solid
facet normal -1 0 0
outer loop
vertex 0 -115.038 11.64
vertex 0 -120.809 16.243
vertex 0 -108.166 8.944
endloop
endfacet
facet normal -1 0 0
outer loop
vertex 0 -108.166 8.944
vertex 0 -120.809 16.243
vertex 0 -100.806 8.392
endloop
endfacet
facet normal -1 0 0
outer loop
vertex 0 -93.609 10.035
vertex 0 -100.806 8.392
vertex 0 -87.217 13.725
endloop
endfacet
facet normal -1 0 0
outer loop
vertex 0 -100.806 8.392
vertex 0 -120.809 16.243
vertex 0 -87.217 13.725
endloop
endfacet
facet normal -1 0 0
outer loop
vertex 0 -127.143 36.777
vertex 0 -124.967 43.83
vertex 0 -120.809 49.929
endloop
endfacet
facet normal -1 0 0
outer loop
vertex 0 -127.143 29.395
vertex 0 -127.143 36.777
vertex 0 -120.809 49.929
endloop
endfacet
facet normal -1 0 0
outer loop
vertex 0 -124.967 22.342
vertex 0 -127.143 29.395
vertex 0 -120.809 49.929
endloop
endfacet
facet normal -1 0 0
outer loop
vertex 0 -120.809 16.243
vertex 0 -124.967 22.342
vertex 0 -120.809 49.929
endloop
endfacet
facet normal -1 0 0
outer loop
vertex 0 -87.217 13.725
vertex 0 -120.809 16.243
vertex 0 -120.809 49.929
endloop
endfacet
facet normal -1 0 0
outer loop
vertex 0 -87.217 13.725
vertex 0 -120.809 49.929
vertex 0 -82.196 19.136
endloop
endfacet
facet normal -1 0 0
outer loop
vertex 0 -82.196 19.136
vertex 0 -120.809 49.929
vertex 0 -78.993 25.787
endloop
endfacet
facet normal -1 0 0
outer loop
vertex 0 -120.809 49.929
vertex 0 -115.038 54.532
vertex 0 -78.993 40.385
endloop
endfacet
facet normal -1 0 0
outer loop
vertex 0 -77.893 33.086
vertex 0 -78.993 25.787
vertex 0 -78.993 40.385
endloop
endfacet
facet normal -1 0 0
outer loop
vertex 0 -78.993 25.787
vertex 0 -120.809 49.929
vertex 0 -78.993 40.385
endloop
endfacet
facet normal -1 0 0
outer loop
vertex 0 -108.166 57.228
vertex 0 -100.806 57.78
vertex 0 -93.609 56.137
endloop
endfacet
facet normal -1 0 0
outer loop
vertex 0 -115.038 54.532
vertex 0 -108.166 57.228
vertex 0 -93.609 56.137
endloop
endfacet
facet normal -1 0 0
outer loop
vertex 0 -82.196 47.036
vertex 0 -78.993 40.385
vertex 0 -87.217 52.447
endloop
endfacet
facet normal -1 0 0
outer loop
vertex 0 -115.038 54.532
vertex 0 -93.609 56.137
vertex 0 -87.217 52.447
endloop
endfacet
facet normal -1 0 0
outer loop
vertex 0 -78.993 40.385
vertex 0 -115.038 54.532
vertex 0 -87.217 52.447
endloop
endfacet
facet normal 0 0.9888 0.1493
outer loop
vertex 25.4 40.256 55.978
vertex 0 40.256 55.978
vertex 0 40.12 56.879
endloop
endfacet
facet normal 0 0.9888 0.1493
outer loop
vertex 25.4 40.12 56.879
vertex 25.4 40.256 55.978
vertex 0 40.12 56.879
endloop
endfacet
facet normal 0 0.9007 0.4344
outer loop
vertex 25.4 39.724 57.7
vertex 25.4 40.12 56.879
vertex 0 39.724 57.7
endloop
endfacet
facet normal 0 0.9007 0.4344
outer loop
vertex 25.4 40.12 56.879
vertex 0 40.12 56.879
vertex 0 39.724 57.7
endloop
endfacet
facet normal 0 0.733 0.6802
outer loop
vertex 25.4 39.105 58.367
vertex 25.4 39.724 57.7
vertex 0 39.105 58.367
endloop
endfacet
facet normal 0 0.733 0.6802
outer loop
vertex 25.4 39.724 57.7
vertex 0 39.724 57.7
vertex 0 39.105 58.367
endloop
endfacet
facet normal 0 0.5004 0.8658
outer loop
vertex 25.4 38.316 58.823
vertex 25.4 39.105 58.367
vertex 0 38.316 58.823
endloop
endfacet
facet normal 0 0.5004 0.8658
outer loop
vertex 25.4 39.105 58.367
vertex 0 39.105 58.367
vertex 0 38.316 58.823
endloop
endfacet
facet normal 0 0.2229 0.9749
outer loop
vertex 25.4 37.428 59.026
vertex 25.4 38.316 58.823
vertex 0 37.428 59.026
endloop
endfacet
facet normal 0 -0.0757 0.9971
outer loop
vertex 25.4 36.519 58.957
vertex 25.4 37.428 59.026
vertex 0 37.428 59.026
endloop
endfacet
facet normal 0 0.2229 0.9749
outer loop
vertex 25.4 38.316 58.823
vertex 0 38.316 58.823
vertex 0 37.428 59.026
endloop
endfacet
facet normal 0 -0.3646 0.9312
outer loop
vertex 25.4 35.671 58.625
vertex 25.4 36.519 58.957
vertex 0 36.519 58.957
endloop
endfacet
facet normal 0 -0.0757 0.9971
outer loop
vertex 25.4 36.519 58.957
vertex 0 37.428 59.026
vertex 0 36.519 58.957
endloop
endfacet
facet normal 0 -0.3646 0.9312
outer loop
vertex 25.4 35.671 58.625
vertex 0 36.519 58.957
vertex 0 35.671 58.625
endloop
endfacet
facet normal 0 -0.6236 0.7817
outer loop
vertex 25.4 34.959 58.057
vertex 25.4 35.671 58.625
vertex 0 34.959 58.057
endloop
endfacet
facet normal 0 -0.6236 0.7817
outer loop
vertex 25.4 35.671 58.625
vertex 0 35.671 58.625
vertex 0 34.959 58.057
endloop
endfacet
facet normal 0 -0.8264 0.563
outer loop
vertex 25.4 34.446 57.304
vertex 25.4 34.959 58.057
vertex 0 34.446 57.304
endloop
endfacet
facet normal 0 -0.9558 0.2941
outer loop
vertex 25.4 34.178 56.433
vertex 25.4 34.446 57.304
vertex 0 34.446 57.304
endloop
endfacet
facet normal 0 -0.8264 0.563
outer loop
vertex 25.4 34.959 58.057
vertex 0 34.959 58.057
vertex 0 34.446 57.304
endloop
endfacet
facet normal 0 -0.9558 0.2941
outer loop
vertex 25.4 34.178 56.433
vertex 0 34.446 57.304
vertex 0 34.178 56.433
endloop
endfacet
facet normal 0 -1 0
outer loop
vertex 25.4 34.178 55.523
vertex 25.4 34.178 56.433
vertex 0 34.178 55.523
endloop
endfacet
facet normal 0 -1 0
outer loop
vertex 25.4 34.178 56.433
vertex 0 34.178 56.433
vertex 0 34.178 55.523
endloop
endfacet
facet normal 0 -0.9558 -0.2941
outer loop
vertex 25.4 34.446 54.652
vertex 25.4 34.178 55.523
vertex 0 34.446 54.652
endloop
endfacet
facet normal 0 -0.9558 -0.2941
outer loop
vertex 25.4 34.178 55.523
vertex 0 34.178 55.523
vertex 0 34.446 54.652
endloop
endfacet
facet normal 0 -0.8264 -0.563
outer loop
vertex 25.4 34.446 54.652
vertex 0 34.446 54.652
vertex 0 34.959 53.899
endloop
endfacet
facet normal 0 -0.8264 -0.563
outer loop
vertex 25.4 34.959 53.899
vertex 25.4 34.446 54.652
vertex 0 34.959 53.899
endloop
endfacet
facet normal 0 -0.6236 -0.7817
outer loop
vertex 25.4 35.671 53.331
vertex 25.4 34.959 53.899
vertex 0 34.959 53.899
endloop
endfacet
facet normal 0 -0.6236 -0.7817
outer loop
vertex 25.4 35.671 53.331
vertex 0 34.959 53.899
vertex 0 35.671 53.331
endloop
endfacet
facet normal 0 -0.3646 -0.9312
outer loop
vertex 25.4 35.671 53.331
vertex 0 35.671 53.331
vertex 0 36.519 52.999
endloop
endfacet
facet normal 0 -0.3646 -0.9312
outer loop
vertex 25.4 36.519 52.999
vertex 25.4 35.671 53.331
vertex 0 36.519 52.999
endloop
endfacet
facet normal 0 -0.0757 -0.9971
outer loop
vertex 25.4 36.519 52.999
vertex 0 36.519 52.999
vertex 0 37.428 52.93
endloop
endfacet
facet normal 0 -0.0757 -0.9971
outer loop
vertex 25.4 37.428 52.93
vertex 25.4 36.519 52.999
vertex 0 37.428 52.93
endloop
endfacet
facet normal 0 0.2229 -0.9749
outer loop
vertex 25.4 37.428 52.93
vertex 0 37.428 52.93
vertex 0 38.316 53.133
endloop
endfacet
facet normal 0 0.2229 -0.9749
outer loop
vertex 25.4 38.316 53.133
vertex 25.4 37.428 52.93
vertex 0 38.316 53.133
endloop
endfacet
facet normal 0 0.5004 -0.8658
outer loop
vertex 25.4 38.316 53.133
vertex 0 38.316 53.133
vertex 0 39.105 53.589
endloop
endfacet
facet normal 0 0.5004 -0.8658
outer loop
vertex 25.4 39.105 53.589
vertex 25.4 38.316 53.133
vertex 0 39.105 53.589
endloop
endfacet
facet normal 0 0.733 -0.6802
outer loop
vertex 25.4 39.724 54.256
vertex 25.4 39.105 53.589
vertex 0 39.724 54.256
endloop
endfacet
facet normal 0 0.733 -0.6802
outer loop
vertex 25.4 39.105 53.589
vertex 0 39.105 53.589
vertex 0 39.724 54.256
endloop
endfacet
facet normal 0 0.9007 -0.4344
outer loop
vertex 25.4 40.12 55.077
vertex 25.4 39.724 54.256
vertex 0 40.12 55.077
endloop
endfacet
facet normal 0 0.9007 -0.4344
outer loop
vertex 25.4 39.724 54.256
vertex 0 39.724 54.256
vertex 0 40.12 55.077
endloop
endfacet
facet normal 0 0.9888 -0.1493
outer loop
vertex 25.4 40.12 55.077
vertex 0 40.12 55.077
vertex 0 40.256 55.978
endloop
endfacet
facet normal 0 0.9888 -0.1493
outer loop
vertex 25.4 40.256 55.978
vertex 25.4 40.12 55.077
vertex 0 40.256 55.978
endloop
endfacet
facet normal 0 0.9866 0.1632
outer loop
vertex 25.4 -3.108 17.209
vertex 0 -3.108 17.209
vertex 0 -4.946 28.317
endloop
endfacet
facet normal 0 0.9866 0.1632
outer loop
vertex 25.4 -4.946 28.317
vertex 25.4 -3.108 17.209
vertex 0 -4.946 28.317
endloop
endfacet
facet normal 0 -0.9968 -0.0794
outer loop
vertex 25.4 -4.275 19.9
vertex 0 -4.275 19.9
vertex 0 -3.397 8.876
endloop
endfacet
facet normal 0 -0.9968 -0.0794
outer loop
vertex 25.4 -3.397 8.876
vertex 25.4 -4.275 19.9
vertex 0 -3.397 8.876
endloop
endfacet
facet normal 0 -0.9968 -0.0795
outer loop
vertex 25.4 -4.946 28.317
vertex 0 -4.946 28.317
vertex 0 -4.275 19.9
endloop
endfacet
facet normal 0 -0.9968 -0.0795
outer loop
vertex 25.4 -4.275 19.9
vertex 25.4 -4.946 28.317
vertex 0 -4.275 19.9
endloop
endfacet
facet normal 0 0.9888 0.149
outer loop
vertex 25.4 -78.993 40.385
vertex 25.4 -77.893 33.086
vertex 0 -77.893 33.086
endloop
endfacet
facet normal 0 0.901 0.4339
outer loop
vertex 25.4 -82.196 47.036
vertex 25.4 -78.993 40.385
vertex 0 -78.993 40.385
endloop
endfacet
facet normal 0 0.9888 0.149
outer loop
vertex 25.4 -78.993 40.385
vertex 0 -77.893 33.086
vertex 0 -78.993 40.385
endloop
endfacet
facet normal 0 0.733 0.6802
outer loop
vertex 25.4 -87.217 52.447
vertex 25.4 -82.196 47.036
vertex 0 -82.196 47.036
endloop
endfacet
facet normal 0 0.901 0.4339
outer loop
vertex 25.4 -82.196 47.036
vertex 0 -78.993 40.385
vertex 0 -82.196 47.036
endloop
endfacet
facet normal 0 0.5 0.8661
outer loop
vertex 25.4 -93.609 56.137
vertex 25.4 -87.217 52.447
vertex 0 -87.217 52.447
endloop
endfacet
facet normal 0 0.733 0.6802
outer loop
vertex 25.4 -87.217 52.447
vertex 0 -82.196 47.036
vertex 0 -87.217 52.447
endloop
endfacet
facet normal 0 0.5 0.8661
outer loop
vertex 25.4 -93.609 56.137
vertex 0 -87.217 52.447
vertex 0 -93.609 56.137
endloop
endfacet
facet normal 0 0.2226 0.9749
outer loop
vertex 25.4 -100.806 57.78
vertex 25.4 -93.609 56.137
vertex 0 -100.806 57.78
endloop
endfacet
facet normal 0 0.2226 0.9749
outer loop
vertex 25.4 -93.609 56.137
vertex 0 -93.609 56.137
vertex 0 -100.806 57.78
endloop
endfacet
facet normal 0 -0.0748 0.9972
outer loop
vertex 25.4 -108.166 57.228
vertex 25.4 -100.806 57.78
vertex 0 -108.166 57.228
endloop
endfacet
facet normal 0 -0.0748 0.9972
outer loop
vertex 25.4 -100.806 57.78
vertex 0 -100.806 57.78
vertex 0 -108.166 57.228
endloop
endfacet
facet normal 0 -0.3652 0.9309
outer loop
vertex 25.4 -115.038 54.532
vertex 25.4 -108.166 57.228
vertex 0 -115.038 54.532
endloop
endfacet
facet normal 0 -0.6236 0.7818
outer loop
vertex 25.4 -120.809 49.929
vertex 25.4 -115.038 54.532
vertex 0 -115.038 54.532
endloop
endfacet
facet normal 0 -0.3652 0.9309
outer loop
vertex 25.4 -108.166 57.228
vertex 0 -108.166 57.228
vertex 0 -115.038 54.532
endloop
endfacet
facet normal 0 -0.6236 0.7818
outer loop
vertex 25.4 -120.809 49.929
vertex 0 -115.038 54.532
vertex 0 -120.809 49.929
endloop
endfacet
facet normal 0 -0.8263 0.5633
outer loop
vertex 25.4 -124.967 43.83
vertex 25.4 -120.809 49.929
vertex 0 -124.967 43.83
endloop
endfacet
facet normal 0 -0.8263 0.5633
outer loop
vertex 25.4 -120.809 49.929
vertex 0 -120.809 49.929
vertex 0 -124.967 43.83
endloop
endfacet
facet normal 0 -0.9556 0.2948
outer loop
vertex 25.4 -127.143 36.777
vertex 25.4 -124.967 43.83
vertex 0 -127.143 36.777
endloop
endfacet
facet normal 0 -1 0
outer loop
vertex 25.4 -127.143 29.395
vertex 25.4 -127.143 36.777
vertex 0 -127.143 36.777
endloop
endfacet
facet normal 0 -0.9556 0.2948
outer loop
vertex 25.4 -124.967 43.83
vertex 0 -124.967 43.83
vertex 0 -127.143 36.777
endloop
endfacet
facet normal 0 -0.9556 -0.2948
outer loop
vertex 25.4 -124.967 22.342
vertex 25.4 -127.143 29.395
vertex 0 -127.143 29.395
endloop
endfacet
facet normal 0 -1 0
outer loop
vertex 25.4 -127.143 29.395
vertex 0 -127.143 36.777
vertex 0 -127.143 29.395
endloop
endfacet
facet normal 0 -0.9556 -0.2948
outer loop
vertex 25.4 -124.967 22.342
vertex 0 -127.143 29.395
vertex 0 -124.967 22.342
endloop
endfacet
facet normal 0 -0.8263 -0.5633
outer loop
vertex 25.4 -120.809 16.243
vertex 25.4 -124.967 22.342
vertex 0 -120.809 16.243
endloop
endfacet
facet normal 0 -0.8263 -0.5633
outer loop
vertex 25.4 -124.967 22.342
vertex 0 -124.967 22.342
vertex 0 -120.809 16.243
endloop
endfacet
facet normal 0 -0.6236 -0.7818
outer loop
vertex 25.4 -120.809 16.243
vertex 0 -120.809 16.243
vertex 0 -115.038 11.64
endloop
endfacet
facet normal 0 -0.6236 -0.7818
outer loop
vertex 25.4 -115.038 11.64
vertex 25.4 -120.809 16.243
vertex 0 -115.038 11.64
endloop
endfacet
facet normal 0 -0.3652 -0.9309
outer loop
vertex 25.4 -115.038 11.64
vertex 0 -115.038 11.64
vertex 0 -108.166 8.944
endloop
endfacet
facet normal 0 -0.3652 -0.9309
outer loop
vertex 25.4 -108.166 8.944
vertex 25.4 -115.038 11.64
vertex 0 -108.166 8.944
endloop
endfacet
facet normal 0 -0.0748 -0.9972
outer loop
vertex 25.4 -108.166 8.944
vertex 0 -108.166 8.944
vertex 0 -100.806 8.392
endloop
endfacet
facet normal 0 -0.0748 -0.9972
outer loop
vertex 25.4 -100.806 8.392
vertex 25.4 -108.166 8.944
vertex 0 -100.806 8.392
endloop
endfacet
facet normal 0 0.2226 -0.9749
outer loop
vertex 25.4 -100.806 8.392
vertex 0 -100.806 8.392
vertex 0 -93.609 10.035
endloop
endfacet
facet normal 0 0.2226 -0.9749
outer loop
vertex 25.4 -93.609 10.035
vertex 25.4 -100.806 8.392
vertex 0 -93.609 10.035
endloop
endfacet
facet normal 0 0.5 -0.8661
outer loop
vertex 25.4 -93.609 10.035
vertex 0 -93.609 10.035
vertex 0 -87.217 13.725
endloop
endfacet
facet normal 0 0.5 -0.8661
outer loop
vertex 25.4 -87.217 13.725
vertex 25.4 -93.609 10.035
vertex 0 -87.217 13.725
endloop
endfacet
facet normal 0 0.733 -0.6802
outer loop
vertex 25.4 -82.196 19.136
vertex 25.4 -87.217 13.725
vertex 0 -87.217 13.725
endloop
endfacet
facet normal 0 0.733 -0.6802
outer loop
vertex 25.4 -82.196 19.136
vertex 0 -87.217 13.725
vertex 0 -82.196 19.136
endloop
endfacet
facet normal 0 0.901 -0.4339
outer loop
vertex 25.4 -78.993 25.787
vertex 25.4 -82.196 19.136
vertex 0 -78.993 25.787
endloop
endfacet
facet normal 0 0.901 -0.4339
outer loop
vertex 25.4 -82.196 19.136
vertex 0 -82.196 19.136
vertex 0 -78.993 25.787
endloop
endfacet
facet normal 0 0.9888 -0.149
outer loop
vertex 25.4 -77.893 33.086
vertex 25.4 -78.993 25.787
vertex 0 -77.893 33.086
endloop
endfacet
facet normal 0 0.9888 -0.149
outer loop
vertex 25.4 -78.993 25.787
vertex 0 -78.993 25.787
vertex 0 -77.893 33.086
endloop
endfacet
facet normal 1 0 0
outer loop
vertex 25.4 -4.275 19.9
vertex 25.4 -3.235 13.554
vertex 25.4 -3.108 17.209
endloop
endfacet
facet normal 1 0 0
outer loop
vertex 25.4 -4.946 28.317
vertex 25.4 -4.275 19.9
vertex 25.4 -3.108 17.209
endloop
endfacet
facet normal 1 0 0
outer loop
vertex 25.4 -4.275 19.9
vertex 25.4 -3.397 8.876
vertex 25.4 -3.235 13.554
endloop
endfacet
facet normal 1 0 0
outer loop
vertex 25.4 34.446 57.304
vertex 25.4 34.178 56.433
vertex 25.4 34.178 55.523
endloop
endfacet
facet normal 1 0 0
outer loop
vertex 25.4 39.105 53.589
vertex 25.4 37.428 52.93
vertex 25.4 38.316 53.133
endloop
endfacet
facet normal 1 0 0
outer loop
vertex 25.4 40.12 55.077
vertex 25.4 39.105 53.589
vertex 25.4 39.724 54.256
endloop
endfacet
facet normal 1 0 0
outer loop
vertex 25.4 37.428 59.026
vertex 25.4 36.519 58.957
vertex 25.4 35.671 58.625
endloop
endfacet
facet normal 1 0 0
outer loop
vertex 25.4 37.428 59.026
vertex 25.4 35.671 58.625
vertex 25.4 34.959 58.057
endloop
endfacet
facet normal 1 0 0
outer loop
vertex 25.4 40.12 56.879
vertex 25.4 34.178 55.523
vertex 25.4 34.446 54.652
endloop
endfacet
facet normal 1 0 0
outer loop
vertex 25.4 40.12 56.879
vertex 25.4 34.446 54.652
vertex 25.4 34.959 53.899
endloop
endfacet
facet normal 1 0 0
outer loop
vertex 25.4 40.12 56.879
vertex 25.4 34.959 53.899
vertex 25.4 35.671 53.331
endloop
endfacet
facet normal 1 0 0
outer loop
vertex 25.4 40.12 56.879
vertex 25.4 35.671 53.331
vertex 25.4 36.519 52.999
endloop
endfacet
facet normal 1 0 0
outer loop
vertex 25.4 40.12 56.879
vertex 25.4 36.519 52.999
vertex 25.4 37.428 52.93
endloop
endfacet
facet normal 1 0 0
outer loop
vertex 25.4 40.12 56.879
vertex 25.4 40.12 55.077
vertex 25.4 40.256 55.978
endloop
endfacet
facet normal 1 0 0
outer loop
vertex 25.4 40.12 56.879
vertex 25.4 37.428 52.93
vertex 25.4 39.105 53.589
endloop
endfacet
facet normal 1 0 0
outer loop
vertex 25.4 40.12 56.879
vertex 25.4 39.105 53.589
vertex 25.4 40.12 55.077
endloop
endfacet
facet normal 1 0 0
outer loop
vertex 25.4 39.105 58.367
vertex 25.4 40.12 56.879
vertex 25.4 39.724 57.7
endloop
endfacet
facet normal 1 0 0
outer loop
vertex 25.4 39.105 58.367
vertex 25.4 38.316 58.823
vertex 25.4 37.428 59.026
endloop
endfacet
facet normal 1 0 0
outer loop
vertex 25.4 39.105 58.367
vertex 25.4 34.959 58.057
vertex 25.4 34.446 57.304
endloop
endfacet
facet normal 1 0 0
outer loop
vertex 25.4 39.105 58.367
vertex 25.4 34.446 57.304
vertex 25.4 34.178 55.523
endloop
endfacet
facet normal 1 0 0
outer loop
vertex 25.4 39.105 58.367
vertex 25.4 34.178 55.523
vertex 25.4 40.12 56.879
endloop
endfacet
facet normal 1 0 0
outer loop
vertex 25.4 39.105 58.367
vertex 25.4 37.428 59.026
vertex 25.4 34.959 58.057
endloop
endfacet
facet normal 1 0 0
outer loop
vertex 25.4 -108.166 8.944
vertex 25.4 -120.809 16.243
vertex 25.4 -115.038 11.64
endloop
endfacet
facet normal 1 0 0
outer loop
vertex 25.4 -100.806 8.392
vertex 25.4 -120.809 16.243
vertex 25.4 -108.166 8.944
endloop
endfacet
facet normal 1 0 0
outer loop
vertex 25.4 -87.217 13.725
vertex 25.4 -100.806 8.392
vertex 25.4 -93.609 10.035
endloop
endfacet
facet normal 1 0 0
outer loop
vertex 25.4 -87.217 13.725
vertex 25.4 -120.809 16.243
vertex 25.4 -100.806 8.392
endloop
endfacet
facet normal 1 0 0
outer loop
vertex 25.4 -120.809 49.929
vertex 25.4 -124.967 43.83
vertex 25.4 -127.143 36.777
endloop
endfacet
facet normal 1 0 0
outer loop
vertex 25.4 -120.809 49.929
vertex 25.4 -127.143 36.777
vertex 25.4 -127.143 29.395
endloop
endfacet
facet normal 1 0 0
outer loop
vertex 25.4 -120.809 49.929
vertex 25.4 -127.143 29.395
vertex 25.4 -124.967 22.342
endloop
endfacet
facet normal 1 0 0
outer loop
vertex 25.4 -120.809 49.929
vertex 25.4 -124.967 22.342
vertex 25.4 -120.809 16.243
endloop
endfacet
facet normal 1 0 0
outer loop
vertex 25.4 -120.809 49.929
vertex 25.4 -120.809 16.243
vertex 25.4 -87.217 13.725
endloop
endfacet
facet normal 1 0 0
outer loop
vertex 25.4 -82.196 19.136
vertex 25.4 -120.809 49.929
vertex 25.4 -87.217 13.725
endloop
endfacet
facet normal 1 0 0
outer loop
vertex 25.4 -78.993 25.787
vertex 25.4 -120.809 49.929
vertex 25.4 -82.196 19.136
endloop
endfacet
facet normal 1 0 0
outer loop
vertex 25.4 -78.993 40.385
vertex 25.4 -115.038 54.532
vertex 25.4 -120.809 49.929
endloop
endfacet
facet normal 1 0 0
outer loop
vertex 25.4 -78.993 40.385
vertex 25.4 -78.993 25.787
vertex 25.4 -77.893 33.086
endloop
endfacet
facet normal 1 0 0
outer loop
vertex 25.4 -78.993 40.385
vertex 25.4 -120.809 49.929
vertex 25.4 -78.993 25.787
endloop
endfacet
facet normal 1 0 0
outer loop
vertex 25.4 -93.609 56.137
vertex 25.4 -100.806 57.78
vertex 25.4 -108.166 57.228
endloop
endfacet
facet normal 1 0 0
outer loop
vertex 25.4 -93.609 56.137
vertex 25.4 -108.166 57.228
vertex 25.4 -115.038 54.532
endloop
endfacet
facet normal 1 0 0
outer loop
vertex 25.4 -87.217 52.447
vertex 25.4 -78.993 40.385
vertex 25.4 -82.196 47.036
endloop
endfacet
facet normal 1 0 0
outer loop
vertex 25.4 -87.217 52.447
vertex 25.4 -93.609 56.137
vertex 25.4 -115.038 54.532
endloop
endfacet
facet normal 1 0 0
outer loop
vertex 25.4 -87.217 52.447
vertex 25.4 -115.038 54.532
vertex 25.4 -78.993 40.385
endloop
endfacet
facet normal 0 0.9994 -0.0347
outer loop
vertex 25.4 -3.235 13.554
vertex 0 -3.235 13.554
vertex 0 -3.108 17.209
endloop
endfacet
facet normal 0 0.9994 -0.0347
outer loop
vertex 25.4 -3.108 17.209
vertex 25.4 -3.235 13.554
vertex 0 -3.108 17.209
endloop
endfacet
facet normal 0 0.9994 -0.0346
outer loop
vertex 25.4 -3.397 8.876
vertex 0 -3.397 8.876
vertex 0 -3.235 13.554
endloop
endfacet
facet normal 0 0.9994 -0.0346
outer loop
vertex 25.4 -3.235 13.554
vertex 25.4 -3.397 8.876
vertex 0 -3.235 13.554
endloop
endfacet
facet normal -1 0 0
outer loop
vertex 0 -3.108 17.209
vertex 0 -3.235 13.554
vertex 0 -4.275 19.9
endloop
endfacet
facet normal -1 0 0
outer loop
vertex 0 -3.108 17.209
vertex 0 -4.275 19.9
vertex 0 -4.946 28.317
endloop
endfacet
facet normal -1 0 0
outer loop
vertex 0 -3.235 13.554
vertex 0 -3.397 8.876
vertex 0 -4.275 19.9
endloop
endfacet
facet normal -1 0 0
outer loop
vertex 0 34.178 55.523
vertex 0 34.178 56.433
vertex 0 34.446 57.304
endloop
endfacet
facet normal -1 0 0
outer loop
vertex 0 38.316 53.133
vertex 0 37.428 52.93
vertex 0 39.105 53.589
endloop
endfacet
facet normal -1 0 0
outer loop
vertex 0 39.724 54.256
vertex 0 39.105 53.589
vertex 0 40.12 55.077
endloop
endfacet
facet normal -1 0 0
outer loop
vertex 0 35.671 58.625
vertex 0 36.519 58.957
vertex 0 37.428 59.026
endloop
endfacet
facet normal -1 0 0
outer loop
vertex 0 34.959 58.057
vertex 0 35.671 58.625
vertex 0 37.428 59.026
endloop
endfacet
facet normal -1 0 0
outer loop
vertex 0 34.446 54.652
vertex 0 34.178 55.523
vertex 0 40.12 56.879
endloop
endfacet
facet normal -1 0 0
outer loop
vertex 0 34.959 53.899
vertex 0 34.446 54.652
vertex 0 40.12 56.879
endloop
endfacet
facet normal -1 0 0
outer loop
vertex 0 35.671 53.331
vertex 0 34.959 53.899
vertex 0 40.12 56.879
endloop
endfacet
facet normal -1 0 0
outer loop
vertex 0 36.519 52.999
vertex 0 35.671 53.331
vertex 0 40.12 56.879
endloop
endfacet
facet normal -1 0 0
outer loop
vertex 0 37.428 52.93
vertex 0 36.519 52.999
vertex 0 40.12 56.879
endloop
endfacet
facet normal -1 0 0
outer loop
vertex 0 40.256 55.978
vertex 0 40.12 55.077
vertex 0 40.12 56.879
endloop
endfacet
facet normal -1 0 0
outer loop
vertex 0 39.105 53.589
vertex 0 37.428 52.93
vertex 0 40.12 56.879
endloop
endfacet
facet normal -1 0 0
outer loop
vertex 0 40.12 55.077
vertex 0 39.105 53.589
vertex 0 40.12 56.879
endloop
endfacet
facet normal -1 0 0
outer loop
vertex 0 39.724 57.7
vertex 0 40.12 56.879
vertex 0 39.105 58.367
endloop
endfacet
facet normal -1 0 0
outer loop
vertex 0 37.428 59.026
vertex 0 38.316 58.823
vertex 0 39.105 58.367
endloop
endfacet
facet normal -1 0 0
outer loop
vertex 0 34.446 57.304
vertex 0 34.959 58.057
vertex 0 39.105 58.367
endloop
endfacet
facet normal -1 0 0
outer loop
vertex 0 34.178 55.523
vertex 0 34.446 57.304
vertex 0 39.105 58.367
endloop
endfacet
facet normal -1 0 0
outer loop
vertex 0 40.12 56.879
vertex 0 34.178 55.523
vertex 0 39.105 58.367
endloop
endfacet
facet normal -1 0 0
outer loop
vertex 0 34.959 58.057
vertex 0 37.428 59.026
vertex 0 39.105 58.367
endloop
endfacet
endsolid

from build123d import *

# Parameters (mm, degrees)
F0_R     = 24.763205
F0_R_2   = 3.056075
F1_DEPTH = 25.4


with BuildPart() as f1:
    # F0 (on Right) → F1 (new body)
    with BuildSketch(Plane.YZ):
        with Locations((-102.656163, 33.086043)):
            Circle(F0_R)
        with Locations((37.199445, 55.978008)):
            Circle(F0_R_2)
        Polygon((-4.275247, 19.899973), (-3.397212, 8.875763), (-3.234661, 13.553892), align=None)
        Polygon((-4.945643, 28.31717), (-4.275247, 19.899973), (-3.234661, 13.553892), (-3.107663, 17.208809), align=None)
    extrude(amount=F1_DEPTH)


solid = f1.part
